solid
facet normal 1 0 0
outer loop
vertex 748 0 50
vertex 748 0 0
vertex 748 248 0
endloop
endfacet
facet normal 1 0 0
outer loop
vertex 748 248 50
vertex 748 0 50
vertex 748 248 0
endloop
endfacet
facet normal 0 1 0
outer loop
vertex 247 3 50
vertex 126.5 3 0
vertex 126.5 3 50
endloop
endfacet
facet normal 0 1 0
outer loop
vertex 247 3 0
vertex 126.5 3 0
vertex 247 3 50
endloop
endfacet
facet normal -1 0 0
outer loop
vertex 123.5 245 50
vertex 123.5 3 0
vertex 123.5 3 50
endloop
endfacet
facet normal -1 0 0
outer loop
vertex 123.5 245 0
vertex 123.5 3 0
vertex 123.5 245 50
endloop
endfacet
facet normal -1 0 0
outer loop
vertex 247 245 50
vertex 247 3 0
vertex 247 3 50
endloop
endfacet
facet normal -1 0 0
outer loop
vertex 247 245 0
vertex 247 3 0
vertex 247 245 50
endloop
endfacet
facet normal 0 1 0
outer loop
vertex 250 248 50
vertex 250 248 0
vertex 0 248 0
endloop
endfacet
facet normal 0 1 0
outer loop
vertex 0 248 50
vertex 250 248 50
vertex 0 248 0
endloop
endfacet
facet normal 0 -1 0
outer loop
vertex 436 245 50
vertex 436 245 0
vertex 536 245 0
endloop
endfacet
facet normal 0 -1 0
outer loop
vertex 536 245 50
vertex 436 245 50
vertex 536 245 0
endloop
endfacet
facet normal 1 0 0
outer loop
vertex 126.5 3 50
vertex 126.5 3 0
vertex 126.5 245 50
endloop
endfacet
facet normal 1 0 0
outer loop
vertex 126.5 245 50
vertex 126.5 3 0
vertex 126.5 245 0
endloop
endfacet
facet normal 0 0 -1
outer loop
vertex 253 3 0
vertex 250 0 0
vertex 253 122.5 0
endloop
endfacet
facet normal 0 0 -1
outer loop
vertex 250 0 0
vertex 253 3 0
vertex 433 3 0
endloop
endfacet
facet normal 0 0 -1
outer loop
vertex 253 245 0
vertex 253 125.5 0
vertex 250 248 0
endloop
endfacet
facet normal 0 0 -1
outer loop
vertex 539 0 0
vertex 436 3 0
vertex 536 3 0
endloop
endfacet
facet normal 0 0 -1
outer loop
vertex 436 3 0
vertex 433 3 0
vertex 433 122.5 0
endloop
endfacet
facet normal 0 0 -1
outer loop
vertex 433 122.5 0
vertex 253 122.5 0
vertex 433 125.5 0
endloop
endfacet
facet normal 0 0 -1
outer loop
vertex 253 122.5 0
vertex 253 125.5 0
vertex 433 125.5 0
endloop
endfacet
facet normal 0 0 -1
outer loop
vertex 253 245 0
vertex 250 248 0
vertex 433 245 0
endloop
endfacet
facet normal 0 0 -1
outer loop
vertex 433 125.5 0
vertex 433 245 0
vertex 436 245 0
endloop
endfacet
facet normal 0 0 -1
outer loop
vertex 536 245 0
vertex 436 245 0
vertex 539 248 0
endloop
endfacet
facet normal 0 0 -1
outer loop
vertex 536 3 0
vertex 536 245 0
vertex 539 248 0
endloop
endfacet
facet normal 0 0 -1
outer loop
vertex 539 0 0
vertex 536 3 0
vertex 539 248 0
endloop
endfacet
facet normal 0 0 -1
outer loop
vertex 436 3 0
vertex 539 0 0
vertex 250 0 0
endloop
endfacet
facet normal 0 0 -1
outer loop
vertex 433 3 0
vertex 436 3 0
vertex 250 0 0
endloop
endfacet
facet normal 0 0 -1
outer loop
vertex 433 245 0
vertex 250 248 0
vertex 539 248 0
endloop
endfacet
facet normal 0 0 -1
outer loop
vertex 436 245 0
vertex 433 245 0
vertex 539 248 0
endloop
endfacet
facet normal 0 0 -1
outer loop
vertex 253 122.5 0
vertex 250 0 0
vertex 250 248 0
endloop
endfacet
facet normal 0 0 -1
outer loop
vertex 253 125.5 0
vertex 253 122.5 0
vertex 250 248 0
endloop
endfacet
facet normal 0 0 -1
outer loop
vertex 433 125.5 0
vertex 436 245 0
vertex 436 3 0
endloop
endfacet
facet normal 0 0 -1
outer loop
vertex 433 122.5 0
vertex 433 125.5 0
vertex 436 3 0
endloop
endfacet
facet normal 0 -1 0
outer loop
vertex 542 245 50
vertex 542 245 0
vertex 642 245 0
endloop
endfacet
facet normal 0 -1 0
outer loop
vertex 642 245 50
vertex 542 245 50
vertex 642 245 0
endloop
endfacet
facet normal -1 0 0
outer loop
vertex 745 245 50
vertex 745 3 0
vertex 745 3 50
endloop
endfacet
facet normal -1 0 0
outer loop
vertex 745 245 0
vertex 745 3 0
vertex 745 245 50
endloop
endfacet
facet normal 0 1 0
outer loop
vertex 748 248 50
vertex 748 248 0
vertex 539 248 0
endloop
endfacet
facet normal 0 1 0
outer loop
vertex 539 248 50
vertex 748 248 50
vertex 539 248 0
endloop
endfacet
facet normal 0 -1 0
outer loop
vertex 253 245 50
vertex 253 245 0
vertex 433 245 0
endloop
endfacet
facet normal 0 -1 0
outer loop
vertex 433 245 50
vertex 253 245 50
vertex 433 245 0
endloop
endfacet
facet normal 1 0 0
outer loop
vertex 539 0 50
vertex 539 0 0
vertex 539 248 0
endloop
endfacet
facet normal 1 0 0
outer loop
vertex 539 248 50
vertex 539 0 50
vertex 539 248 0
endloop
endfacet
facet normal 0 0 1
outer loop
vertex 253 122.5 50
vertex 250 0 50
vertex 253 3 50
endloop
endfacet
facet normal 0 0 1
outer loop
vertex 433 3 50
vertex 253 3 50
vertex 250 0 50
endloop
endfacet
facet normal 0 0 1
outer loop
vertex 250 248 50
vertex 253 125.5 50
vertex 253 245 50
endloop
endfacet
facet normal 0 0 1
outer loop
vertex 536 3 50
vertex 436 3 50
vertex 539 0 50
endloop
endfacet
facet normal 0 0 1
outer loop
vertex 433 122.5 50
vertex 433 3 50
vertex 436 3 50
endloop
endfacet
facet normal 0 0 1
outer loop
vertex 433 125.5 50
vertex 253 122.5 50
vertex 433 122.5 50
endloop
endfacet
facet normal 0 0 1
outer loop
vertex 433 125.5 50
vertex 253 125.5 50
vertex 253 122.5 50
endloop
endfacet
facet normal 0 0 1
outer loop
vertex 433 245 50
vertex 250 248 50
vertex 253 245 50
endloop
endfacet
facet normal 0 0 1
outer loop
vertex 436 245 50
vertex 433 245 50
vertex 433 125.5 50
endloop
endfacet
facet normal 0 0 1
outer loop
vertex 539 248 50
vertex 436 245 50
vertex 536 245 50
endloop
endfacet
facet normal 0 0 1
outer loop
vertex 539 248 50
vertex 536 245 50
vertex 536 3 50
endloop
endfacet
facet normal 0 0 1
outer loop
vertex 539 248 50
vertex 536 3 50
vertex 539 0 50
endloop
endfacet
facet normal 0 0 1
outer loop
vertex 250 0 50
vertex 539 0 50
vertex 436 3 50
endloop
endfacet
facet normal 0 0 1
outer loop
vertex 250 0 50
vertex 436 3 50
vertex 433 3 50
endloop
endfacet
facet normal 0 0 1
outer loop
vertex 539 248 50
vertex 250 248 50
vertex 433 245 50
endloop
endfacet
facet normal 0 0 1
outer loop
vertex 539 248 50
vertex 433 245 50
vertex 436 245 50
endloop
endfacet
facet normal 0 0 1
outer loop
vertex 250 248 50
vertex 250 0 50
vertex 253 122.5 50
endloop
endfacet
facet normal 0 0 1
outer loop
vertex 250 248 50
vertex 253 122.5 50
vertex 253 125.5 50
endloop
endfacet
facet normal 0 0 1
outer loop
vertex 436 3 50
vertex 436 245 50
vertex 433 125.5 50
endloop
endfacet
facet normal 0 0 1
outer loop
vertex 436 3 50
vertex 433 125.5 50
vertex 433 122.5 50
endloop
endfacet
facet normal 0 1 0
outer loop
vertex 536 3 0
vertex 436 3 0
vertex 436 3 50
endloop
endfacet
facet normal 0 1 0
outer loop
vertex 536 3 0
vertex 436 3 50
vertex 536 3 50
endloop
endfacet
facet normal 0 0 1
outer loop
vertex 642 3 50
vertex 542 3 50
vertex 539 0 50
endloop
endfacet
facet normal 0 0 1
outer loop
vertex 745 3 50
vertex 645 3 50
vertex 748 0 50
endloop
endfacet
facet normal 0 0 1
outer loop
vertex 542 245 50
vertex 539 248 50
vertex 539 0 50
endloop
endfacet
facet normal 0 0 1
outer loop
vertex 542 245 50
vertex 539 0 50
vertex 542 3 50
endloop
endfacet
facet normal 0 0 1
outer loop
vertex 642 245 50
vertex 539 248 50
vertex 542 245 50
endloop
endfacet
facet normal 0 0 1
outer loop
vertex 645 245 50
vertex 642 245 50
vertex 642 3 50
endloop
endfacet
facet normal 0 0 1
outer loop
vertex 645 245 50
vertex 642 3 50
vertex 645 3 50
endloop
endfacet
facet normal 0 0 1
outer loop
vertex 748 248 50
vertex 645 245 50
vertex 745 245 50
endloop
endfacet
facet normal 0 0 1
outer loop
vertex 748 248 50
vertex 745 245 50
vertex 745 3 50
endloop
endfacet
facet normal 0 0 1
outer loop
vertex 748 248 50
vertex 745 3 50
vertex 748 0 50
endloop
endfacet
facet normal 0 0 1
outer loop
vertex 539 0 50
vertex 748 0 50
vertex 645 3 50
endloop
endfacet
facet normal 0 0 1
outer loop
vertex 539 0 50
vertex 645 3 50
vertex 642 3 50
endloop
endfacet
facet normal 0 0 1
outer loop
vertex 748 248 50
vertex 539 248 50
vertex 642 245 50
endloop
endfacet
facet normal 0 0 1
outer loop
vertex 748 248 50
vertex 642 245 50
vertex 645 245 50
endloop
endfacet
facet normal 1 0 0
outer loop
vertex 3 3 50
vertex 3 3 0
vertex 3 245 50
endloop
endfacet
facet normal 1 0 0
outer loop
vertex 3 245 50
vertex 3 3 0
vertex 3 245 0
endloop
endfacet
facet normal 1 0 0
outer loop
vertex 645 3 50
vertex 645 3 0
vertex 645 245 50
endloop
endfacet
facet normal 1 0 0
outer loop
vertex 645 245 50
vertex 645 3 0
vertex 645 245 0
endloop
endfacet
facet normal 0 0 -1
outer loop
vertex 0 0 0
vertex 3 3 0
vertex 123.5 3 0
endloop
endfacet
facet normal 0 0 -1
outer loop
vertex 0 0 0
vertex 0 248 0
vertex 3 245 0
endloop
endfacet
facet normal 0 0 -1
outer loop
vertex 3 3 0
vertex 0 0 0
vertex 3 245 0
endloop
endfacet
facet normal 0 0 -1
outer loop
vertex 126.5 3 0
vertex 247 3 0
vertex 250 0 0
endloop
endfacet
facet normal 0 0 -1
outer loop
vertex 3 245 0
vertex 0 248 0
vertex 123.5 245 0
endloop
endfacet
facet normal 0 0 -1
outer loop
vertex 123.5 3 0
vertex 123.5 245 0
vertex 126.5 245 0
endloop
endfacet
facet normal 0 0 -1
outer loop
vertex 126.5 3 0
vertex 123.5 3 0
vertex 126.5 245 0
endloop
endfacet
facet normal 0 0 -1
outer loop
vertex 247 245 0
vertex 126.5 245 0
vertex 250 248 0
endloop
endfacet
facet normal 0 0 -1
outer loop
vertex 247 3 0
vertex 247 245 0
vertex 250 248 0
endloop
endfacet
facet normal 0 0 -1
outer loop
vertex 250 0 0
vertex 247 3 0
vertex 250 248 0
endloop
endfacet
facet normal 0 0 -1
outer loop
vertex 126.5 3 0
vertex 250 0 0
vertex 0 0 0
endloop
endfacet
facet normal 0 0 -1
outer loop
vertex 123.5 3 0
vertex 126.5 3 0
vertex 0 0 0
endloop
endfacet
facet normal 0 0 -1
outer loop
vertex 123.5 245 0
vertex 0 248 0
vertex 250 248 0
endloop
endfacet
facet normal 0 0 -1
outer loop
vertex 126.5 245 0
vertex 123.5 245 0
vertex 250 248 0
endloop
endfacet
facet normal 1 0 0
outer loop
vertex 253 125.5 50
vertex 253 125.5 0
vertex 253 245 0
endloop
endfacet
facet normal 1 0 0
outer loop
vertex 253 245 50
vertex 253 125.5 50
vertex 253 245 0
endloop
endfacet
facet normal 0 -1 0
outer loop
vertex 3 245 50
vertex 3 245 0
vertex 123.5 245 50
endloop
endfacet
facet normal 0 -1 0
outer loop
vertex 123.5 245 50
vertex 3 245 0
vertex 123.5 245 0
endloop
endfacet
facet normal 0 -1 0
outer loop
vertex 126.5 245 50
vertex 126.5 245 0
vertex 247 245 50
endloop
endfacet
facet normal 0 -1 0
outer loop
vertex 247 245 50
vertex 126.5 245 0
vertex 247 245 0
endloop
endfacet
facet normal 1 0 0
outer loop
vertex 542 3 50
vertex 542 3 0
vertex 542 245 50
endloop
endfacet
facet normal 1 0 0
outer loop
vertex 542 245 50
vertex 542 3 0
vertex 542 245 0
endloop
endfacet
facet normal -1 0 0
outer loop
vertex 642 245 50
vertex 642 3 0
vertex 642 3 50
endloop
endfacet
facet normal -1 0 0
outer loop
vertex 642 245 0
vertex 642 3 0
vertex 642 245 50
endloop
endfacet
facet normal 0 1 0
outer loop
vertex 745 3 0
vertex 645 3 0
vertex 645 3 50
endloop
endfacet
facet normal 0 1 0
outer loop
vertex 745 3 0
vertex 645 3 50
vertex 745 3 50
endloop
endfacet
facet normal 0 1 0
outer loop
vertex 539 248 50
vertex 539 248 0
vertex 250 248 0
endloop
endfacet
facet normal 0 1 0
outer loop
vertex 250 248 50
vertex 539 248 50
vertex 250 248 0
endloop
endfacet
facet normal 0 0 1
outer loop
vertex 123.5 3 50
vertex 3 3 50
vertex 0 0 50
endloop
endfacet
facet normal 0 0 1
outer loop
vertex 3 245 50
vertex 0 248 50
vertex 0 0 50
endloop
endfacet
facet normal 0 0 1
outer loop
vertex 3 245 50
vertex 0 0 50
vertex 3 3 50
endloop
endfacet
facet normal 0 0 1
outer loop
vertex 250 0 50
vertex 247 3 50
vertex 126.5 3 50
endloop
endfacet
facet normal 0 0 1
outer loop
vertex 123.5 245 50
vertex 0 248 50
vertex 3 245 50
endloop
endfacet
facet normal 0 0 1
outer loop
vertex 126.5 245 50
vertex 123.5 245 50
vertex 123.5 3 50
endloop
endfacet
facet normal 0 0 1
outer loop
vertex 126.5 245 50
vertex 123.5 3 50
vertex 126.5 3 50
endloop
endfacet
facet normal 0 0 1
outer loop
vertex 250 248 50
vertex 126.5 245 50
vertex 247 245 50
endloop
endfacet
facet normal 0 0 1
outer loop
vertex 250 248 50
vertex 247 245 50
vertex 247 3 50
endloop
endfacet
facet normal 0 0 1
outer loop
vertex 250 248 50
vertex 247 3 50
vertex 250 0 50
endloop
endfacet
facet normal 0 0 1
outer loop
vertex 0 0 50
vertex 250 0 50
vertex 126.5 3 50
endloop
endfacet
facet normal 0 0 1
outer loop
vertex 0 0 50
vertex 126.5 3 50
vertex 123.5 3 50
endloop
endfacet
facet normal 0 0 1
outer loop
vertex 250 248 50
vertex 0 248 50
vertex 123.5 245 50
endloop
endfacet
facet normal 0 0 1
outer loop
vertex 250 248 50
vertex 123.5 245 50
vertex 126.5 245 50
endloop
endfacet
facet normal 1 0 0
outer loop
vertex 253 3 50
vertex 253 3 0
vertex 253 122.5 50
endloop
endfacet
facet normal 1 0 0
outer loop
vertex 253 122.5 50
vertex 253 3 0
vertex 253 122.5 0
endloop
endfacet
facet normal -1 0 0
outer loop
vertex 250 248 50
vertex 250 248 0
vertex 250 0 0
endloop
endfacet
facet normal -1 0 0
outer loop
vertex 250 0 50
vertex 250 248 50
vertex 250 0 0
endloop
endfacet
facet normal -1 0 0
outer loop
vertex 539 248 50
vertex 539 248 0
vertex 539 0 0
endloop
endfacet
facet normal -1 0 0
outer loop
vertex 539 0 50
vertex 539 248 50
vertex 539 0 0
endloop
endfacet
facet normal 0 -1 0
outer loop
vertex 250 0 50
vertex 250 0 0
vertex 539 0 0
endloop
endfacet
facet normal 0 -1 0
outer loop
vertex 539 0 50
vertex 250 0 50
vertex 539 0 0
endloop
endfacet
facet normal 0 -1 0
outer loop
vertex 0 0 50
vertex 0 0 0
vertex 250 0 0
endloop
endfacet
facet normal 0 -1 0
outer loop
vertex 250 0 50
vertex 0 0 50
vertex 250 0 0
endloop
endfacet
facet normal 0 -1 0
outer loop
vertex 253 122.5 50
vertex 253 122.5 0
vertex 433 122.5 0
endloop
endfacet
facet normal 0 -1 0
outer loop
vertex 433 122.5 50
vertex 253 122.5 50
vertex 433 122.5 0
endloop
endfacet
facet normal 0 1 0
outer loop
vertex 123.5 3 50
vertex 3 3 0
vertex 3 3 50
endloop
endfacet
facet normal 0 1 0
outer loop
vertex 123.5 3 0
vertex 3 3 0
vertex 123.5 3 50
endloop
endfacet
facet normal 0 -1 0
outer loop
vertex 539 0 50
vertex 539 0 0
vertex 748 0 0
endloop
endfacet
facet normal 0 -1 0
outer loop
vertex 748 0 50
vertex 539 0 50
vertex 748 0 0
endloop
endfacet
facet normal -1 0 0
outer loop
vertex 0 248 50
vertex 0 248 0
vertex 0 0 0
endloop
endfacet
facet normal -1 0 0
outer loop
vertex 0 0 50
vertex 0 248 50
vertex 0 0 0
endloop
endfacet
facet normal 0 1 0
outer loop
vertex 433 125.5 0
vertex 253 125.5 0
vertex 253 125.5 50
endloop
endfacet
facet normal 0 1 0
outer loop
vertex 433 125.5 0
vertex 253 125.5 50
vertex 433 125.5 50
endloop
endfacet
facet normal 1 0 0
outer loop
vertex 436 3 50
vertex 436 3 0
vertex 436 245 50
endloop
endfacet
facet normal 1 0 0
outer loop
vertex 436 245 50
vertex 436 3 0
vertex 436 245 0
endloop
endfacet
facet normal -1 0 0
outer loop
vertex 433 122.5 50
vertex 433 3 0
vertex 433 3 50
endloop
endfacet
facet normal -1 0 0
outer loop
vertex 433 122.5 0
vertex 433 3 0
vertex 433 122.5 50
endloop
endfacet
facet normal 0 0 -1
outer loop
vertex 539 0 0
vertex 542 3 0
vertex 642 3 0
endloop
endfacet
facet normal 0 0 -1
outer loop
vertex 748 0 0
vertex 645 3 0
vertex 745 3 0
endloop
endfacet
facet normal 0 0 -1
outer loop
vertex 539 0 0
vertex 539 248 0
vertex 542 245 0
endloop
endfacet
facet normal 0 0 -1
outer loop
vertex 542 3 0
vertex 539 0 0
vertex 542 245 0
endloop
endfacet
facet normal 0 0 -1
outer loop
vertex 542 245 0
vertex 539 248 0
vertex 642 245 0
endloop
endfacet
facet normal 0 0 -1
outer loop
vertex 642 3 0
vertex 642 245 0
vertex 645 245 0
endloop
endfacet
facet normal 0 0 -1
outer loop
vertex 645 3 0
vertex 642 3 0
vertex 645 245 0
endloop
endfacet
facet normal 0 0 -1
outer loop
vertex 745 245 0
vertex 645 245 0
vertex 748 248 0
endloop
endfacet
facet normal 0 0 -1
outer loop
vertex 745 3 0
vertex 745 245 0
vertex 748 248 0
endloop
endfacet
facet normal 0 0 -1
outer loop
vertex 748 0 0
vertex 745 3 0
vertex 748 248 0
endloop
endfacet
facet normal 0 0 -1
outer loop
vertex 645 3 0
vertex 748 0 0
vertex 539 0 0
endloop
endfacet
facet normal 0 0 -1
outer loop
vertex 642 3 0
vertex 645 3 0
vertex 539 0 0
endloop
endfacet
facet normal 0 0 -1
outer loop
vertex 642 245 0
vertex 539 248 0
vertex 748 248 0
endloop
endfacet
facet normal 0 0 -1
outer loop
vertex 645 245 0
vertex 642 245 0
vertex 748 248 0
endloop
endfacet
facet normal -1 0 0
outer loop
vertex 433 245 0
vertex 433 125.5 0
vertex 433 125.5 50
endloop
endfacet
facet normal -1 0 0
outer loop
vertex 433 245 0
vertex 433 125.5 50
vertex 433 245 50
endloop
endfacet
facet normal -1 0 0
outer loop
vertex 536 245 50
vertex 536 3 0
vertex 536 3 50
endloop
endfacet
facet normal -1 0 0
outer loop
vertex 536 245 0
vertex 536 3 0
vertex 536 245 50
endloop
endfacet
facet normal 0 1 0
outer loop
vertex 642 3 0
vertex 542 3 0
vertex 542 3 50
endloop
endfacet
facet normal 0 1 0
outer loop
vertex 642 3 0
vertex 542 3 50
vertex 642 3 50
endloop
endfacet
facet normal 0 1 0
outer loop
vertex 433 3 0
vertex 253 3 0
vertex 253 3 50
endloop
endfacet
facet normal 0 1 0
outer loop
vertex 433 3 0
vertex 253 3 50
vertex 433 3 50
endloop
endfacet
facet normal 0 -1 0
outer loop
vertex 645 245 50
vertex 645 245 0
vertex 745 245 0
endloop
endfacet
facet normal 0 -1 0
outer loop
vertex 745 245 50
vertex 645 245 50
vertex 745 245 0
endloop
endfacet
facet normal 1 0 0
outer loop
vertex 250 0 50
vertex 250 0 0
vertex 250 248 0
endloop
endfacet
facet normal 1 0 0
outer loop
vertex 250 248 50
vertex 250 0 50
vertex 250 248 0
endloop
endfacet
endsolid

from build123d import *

# Parameters (mm, degrees)
F0_W     = 100
F0_H     = 242
F1_DEPTH = 50
F0_W_2   = 180
F0_H_2   = 119.5
F2_DEPTH = 50
F0_W_3   = 120.5
F3_DEPTH = 50


with BuildPart() as f1:
    # F0 (on Top) → F1 (new body)
    with BuildSketch(Plane.XY):
        Polygon((539, 3), (539, 0), (748, 0), (748, 248), (539, 248), (539, 245), align=None)
        with Locations((592, 124)):
            Rectangle(F0_W, F0_H, mode=Mode.SUBTRACT)
        with Locations((695, 124)):
            Rectangle(F0_W, F0_H, mode=Mode.SUBTRACT)
    extrude(amount=F1_DEPTH)


with BuildPart() as f2:
    # F0 (on Top) → F2 (new body)
    with BuildSketch(Plane.XY):
        Polygon((250, 3), (250, 0), (539, 0), (539, 3), (539, 245), (539, 248), (250, 248), (250, 245), align=None)
        with Locations((343, 62.75)):
            Rectangle(F0_W_2, F0_H_2, mode=Mode.SUBTRACT)
        with Locations((343, 185.25)):
            Rectangle(F0_W_2, F0_H_2, mode=Mode.SUBTRACT)
        with Locations((486, 124)):
            Rectangle(F0_W, F0_H, mode=Mode.SUBTRACT)
    extrude(amount=F2_DEPTH)


with BuildPart() as f3:
    # F0 (on Top) → F3 (new body)
    with BuildSketch(Plane.XY):
        Polygon((0, 248), (0, 0), (250, 0), (250, 3), (250, 245), (250, 248), align=None)
        with Locations((63.25, 124)):
            Rectangle(F0_W_3, F0_H, mode=Mode.SUBTRACT)
        with Locations((186.75, 124)):
            Rectangle(F0_W_3, F0_H, mode=Mode.SUBTRACT)
    extrude(amount=F3_DEPTH)


solid = Compound([f1.part, f2.part, f3.part])
